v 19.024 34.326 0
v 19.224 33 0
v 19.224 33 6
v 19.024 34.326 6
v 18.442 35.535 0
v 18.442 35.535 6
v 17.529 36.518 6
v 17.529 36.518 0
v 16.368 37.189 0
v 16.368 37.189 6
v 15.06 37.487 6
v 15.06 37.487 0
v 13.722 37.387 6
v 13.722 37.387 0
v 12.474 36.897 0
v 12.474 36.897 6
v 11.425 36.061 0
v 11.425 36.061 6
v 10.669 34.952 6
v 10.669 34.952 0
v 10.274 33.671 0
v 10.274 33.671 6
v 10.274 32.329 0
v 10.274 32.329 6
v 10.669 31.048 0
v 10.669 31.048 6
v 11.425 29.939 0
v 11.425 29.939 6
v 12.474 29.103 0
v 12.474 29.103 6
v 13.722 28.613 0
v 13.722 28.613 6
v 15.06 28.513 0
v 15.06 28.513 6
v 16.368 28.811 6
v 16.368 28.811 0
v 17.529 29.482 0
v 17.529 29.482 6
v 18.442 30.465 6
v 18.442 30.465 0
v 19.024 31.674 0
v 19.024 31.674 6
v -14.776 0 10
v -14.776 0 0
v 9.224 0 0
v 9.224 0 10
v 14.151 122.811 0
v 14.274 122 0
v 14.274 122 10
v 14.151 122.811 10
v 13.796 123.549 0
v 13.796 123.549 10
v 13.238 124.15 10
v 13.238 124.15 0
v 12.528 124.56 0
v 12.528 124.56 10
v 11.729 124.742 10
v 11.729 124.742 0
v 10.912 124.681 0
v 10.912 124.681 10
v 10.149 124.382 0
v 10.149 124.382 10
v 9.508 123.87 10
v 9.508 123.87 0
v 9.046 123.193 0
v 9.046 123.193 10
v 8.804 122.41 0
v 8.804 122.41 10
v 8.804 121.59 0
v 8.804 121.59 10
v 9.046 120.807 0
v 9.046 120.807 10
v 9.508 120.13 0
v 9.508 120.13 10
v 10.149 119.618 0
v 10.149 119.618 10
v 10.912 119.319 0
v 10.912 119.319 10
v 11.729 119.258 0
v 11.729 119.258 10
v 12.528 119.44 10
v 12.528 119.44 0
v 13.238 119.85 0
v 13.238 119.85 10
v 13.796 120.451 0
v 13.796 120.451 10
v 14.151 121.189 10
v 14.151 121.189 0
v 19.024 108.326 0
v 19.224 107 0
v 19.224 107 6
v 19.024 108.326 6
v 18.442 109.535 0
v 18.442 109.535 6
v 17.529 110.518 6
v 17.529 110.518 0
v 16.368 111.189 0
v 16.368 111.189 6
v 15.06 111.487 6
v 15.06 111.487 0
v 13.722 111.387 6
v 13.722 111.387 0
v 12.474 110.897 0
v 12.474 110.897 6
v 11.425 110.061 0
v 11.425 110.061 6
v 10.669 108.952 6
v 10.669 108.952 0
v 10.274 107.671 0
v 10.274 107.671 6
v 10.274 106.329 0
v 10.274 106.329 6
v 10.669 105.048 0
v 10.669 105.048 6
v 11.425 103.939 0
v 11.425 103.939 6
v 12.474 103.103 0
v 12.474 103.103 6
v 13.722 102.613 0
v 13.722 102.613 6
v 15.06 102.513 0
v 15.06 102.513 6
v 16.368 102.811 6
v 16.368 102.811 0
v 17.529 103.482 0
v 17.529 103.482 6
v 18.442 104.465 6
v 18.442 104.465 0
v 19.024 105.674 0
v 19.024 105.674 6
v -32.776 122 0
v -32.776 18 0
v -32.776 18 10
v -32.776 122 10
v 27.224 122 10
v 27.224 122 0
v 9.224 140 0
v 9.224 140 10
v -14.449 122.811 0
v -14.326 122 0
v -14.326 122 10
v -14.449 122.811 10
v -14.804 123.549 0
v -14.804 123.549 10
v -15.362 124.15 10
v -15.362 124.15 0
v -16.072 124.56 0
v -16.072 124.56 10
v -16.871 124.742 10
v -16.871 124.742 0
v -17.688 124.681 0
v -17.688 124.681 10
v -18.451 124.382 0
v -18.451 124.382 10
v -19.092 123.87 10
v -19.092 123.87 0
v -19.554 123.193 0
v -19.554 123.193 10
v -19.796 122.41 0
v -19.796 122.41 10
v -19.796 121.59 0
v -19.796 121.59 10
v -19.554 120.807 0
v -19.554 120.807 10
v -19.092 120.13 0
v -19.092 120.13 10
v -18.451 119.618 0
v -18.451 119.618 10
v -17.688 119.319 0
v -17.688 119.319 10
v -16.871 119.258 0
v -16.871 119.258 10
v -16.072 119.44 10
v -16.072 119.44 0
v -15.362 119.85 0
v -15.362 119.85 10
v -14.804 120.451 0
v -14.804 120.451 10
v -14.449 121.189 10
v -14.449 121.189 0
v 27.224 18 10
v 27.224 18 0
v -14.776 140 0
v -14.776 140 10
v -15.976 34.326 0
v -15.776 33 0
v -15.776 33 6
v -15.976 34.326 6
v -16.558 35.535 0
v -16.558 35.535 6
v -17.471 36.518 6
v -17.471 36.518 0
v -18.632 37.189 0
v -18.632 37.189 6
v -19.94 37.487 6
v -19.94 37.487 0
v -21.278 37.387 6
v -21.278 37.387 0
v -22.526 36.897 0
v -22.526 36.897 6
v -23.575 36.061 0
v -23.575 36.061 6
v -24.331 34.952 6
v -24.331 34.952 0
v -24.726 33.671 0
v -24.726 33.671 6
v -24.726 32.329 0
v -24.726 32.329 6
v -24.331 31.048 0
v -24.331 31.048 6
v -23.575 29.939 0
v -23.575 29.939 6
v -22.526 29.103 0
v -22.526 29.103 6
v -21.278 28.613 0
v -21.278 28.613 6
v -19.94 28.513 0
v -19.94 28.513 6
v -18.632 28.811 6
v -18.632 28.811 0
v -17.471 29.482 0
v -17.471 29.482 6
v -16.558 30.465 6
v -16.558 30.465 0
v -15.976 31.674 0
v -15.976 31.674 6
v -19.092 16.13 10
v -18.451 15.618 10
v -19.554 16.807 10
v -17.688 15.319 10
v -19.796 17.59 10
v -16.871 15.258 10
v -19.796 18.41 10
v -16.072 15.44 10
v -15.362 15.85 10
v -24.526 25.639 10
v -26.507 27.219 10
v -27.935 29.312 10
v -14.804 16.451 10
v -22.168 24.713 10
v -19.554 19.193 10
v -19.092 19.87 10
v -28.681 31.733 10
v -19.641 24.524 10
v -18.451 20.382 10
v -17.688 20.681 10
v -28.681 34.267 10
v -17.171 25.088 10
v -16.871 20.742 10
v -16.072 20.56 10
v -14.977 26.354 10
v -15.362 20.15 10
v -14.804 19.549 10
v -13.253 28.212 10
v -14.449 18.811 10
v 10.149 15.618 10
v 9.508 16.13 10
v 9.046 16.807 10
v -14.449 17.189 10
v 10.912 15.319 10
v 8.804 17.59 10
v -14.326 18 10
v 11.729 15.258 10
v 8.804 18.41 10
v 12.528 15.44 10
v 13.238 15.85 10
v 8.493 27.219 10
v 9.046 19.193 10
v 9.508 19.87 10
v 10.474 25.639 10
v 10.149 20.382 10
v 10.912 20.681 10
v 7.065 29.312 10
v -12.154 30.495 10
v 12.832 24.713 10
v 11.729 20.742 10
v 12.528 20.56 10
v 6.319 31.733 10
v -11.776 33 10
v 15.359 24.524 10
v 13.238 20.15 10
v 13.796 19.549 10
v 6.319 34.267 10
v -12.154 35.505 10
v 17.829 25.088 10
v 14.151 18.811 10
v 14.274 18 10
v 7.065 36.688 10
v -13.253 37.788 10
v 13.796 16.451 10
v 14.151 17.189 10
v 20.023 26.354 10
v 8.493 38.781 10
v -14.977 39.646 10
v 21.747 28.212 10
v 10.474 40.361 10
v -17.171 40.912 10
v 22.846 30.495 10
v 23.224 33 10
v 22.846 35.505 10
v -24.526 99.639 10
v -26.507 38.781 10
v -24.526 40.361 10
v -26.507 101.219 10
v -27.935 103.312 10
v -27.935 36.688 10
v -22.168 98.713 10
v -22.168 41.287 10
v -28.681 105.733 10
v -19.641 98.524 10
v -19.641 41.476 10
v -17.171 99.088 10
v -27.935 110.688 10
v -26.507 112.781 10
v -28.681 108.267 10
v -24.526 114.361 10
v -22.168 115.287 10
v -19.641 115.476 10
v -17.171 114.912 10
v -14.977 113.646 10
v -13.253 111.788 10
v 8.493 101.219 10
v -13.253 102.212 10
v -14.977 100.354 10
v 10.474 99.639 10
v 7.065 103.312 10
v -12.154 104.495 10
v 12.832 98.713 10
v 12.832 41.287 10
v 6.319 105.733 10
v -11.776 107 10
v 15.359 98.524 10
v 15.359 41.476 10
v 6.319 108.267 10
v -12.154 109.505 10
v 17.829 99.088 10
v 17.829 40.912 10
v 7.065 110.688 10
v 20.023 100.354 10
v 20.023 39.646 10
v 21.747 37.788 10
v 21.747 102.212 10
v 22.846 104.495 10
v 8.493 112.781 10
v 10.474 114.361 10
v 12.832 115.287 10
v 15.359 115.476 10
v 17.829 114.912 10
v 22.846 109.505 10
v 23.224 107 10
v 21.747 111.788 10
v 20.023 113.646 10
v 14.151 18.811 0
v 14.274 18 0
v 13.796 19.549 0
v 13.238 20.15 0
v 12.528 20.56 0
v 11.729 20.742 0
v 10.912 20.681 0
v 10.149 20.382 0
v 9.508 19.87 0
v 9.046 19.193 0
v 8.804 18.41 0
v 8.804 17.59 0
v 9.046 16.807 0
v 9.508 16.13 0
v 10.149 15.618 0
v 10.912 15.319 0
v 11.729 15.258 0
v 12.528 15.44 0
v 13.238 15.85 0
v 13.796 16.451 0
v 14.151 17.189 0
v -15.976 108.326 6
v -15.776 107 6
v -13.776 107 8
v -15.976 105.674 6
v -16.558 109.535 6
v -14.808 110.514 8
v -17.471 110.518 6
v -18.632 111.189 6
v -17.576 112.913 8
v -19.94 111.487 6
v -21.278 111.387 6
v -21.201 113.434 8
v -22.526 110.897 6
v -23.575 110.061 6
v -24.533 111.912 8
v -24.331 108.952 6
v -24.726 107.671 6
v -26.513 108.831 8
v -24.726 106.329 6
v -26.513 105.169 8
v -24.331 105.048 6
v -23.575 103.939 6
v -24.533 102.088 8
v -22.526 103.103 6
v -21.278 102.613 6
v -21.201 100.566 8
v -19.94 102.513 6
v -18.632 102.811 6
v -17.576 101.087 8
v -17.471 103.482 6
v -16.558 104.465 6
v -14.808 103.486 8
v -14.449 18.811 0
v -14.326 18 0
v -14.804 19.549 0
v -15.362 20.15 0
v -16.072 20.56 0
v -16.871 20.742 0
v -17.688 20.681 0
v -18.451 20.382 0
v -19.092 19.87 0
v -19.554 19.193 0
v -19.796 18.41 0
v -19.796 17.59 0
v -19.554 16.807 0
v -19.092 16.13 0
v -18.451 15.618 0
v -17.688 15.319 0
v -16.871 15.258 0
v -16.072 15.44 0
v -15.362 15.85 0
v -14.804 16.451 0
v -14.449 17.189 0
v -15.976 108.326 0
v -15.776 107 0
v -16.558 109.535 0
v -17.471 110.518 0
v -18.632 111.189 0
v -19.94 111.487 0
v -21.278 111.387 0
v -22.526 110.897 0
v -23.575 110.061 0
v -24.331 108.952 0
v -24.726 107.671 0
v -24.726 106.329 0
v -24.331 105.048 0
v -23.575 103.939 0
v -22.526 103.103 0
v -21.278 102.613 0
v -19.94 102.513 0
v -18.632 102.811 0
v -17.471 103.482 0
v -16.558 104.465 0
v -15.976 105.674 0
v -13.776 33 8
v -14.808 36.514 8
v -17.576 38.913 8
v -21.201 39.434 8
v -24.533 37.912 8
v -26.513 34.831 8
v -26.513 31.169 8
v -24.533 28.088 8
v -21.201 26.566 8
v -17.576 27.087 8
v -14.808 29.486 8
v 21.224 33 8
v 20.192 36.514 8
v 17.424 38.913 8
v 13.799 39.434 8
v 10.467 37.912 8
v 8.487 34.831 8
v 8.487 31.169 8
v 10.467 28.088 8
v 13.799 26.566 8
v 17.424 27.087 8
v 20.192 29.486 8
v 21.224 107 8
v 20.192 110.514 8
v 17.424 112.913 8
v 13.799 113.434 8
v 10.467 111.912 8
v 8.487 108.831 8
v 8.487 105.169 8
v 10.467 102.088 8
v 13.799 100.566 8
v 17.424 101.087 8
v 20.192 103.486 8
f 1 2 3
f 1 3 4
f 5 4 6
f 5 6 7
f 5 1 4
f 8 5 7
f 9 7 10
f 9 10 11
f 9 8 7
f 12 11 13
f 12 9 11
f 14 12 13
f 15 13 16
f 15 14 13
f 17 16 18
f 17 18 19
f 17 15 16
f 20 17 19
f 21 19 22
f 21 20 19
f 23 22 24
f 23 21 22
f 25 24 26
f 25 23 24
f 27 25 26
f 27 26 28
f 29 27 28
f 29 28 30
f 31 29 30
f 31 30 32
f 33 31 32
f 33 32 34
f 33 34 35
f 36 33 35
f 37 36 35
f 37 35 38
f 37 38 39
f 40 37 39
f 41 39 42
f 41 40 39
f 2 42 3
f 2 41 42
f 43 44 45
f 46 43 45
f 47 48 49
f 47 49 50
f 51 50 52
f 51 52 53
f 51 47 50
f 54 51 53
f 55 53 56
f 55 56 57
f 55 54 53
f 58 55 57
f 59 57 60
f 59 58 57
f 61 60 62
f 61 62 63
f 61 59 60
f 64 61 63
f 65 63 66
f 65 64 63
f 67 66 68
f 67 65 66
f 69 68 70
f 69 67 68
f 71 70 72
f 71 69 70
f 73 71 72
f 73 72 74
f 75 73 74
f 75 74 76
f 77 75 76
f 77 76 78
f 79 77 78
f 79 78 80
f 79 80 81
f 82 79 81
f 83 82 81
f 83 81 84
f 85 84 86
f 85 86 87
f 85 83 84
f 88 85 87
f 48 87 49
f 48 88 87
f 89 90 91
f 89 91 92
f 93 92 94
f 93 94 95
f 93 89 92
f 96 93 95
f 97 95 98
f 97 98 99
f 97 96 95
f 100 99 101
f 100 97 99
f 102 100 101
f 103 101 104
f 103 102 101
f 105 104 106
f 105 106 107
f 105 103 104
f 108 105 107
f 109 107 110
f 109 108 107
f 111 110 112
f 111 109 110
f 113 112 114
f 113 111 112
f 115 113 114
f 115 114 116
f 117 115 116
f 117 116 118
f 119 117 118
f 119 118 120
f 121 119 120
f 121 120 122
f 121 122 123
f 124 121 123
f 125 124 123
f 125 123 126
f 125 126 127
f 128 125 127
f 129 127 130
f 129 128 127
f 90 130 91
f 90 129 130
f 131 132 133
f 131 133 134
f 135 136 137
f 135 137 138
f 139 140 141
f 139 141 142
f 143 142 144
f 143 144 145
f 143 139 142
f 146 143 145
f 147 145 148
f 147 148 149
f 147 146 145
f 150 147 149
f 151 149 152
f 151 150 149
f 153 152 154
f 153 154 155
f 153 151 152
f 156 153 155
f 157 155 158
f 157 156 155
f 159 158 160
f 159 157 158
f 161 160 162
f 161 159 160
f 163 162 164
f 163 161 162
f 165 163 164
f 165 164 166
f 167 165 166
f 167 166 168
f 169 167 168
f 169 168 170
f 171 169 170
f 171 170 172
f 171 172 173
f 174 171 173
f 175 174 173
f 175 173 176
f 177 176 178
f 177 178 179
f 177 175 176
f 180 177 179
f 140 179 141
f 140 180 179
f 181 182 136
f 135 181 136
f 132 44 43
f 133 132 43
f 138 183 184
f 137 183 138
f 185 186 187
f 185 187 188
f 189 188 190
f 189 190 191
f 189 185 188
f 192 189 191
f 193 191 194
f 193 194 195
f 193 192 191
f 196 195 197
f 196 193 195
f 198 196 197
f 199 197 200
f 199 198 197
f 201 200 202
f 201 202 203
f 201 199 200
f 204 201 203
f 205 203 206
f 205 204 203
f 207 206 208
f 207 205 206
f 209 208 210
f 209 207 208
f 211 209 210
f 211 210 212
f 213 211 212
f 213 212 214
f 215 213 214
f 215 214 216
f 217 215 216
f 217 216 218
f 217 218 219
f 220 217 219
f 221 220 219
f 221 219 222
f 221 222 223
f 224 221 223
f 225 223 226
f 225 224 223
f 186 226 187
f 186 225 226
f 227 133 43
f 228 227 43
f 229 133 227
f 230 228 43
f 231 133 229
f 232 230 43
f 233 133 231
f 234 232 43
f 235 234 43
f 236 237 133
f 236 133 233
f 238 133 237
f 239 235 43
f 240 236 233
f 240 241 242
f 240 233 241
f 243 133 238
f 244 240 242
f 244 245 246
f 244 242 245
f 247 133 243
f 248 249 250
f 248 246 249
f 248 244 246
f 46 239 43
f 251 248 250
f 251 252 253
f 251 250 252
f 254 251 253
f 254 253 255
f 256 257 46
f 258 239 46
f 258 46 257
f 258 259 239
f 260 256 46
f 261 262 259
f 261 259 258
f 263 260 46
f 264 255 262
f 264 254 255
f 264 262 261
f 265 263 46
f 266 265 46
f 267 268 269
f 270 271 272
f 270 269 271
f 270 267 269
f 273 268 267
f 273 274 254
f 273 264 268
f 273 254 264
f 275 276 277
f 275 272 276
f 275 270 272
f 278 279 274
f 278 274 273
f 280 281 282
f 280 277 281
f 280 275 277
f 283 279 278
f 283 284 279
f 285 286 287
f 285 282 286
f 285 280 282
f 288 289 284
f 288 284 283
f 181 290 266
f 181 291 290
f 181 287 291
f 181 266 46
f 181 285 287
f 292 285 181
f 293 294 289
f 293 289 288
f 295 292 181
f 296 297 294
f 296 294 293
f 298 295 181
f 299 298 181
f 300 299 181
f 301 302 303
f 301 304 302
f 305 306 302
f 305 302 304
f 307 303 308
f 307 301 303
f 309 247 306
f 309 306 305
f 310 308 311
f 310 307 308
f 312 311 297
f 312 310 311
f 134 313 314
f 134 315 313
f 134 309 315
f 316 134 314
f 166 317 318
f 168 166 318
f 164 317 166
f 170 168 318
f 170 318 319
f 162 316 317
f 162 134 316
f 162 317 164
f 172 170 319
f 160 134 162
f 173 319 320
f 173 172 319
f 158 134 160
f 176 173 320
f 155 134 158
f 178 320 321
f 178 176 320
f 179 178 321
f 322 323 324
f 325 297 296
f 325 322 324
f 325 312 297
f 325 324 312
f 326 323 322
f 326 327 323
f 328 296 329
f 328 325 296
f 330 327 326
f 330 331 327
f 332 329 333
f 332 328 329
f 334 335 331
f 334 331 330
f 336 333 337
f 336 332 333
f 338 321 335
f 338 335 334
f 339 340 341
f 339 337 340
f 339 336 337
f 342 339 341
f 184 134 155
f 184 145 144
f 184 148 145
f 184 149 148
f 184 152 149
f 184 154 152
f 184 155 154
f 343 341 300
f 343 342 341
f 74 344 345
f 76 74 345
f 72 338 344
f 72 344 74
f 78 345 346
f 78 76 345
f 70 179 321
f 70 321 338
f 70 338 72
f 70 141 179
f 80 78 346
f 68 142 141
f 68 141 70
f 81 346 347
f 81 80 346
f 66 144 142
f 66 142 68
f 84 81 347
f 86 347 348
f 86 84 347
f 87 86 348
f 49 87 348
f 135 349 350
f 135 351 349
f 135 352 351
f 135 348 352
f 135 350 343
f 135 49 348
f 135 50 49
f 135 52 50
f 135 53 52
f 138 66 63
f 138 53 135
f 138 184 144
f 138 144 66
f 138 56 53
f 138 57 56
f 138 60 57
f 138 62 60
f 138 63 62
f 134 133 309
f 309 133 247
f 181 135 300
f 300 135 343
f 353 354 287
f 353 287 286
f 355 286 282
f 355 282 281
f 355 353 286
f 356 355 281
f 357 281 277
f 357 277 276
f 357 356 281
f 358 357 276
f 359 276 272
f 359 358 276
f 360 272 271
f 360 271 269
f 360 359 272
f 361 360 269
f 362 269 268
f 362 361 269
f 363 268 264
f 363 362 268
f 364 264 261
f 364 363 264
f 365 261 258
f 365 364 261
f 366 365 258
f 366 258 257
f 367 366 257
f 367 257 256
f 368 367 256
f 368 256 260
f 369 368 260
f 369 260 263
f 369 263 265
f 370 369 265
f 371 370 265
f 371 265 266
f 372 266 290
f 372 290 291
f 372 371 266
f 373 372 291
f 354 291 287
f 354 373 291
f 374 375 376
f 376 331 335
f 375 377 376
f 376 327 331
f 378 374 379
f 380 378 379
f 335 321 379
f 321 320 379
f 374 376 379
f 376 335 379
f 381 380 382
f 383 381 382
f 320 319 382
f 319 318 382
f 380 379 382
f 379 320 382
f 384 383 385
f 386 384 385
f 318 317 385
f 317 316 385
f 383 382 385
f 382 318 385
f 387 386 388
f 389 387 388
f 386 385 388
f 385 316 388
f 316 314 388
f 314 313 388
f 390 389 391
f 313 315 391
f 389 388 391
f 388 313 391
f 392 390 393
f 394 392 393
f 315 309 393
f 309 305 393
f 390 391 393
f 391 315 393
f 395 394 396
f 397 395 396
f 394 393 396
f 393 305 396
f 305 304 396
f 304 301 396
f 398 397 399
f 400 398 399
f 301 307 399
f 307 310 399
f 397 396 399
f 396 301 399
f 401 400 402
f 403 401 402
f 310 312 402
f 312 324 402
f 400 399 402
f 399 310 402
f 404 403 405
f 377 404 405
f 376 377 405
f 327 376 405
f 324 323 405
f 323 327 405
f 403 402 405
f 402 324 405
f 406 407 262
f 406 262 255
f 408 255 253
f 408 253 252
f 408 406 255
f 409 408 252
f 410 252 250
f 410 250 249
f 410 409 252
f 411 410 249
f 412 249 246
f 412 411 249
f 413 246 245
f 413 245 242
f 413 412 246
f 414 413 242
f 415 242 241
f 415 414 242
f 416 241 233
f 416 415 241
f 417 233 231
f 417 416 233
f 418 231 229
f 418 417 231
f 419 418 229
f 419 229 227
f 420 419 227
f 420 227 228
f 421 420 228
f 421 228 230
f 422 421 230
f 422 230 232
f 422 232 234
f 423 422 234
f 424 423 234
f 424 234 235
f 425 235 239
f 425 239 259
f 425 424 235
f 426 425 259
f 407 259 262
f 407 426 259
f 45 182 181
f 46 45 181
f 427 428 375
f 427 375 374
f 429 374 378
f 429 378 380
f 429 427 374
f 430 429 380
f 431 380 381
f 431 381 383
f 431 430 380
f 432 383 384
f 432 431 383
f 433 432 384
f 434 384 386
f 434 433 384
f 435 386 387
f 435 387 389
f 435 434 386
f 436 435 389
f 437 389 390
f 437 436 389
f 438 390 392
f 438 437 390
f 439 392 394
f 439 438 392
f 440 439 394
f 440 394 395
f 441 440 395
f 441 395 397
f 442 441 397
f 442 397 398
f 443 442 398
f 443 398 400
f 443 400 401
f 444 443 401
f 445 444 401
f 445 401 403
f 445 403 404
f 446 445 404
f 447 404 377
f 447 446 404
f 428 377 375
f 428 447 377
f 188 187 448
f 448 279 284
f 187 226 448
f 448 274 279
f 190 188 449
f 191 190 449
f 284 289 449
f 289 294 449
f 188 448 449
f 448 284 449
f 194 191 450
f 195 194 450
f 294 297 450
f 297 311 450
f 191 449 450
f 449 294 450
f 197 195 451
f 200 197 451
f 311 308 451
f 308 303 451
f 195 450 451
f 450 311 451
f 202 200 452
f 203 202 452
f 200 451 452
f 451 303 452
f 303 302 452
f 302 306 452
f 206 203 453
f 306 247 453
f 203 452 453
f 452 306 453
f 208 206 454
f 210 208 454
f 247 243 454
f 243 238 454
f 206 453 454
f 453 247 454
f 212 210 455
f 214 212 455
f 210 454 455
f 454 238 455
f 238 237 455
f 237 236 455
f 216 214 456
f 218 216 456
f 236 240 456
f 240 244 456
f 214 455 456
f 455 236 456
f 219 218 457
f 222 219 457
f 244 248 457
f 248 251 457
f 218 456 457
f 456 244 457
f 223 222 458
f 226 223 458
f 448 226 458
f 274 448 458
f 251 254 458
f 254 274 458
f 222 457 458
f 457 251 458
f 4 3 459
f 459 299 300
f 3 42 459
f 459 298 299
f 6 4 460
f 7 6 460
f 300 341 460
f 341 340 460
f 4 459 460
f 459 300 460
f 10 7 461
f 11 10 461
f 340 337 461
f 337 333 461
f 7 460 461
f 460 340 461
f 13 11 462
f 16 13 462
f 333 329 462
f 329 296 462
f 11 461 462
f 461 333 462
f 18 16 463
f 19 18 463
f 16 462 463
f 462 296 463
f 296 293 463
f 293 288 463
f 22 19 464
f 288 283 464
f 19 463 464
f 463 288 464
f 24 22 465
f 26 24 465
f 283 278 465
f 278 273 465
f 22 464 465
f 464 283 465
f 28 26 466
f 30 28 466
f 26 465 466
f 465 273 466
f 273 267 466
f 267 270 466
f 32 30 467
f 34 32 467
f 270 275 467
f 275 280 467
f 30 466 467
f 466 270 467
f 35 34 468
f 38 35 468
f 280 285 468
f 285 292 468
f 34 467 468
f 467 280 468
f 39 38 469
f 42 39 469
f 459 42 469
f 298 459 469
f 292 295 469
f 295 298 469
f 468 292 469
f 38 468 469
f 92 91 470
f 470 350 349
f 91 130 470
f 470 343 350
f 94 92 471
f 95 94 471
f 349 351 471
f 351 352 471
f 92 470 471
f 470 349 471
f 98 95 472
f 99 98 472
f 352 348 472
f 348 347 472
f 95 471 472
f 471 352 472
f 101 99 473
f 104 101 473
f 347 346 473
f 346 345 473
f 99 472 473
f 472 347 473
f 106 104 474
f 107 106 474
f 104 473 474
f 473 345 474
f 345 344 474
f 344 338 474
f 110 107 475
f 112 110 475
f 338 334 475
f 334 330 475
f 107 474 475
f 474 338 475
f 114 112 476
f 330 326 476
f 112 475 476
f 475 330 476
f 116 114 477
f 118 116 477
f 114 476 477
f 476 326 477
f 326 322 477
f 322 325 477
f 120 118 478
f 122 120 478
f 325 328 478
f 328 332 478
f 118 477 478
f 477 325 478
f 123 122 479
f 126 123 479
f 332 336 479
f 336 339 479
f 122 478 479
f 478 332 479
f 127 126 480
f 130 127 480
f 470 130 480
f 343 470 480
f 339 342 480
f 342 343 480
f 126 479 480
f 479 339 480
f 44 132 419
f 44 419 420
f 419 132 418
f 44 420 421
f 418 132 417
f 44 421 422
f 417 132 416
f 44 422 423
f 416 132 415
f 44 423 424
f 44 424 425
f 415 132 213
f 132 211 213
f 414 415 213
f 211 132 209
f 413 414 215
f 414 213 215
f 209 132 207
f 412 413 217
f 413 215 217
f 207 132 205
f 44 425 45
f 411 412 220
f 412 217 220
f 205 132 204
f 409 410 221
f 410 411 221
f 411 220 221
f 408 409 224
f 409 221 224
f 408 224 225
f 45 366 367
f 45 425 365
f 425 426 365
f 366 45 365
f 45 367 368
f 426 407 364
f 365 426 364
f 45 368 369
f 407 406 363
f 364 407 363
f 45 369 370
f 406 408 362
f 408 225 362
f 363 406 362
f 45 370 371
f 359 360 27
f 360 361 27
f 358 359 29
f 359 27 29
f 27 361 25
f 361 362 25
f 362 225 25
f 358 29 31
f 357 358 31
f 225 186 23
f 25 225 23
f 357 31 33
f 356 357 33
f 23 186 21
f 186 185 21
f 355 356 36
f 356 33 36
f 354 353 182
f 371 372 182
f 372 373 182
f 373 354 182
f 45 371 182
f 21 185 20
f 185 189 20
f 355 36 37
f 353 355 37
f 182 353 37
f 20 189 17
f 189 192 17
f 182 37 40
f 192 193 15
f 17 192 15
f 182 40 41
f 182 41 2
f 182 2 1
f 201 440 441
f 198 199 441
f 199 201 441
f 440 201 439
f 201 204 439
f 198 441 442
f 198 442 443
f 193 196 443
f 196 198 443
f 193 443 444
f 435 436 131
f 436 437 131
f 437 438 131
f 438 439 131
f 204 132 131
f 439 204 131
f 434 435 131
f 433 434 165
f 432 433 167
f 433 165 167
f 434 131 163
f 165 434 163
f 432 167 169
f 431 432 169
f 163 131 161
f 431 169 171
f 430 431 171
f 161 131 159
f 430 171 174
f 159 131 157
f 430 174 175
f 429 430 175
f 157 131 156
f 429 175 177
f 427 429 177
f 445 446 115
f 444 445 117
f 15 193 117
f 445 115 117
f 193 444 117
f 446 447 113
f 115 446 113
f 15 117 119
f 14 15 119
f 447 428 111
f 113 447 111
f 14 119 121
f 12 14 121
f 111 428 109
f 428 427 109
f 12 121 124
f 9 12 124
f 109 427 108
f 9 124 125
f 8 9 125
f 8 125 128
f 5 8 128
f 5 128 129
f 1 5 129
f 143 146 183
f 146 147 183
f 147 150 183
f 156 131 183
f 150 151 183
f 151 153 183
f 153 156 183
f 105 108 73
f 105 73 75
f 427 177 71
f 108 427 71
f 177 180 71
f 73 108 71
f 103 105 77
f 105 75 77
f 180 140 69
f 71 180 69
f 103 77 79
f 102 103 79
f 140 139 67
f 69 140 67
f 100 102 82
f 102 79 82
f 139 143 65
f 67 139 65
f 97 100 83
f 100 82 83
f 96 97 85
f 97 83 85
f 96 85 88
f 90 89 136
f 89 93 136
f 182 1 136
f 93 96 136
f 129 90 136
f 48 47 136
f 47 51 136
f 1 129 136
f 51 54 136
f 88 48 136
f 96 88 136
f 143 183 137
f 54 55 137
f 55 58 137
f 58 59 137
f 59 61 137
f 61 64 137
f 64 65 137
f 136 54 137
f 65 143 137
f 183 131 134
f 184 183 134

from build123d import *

# Parameters (mm, degrees)
F0_W     = 60
F0_H     = 140
F0_R     = 4.5
F0_R_2   = 2.75
F1_DEPTH = 10
F2_SIZE  = 4
F3_SIZE  = 18


with BuildPart() as f1:
    # F0 (on Top) → F1 (new body)
    with BuildSketch(Plane.XY):
        with Locations((-2.776433, 70)):
            Rectangle(F0_W, F0_H)
        with Locations((-20.276433, 33)):
            Circle(F0_R, mode=Mode.SUBTRACT)
        with Locations((-17.076433, 18)):
            Circle(F0_R_2, mode=Mode.SUBTRACT)
        with Locations((11.523567, 18)):
            Circle(F0_R_2, mode=Mode.SUBTRACT)
        with Locations((14.723567, 33)):
            Circle(F0_R, mode=Mode.SUBTRACT)
        with Locations((-20.276433, 107)):
            Circle(F0_R, mode=Mode.SUBTRACT)
        with Locations((-17.076433, 122)):
            Circle(F0_R_2, mode=Mode.SUBTRACT)
        with Locations((11.523567, 122)):
            Circle(F0_R_2, mode=Mode.SUBTRACT)
        with Locations((14.723567, 107)):
            Circle(F0_R, mode=Mode.SUBTRACT)
    extrude(amount=F1_DEPTH)

    # F2
    f2_edges = [f1.edges().sort_by_distance(p)[0] for p in [
        (-24.776433, 33, 10),
        (10.223567, 33, 10),
        (10.223567, 107, 10),
        (-24.776433, 107, 10),
    ]]
    chamfer(f2_edges, length=F2_SIZE)

    # F3
    f3_edges = [f1.edges().sort_by_distance(p)[0] for p in [
        (-32.776433, 0, 5),
        (27.223567, 0, 5),
        (27.223567, 140, 5),
        (-32.776433, 140, 5),
    ]]
    chamfer(f3_edges, length=F3_SIZE)


solid = f1.part
